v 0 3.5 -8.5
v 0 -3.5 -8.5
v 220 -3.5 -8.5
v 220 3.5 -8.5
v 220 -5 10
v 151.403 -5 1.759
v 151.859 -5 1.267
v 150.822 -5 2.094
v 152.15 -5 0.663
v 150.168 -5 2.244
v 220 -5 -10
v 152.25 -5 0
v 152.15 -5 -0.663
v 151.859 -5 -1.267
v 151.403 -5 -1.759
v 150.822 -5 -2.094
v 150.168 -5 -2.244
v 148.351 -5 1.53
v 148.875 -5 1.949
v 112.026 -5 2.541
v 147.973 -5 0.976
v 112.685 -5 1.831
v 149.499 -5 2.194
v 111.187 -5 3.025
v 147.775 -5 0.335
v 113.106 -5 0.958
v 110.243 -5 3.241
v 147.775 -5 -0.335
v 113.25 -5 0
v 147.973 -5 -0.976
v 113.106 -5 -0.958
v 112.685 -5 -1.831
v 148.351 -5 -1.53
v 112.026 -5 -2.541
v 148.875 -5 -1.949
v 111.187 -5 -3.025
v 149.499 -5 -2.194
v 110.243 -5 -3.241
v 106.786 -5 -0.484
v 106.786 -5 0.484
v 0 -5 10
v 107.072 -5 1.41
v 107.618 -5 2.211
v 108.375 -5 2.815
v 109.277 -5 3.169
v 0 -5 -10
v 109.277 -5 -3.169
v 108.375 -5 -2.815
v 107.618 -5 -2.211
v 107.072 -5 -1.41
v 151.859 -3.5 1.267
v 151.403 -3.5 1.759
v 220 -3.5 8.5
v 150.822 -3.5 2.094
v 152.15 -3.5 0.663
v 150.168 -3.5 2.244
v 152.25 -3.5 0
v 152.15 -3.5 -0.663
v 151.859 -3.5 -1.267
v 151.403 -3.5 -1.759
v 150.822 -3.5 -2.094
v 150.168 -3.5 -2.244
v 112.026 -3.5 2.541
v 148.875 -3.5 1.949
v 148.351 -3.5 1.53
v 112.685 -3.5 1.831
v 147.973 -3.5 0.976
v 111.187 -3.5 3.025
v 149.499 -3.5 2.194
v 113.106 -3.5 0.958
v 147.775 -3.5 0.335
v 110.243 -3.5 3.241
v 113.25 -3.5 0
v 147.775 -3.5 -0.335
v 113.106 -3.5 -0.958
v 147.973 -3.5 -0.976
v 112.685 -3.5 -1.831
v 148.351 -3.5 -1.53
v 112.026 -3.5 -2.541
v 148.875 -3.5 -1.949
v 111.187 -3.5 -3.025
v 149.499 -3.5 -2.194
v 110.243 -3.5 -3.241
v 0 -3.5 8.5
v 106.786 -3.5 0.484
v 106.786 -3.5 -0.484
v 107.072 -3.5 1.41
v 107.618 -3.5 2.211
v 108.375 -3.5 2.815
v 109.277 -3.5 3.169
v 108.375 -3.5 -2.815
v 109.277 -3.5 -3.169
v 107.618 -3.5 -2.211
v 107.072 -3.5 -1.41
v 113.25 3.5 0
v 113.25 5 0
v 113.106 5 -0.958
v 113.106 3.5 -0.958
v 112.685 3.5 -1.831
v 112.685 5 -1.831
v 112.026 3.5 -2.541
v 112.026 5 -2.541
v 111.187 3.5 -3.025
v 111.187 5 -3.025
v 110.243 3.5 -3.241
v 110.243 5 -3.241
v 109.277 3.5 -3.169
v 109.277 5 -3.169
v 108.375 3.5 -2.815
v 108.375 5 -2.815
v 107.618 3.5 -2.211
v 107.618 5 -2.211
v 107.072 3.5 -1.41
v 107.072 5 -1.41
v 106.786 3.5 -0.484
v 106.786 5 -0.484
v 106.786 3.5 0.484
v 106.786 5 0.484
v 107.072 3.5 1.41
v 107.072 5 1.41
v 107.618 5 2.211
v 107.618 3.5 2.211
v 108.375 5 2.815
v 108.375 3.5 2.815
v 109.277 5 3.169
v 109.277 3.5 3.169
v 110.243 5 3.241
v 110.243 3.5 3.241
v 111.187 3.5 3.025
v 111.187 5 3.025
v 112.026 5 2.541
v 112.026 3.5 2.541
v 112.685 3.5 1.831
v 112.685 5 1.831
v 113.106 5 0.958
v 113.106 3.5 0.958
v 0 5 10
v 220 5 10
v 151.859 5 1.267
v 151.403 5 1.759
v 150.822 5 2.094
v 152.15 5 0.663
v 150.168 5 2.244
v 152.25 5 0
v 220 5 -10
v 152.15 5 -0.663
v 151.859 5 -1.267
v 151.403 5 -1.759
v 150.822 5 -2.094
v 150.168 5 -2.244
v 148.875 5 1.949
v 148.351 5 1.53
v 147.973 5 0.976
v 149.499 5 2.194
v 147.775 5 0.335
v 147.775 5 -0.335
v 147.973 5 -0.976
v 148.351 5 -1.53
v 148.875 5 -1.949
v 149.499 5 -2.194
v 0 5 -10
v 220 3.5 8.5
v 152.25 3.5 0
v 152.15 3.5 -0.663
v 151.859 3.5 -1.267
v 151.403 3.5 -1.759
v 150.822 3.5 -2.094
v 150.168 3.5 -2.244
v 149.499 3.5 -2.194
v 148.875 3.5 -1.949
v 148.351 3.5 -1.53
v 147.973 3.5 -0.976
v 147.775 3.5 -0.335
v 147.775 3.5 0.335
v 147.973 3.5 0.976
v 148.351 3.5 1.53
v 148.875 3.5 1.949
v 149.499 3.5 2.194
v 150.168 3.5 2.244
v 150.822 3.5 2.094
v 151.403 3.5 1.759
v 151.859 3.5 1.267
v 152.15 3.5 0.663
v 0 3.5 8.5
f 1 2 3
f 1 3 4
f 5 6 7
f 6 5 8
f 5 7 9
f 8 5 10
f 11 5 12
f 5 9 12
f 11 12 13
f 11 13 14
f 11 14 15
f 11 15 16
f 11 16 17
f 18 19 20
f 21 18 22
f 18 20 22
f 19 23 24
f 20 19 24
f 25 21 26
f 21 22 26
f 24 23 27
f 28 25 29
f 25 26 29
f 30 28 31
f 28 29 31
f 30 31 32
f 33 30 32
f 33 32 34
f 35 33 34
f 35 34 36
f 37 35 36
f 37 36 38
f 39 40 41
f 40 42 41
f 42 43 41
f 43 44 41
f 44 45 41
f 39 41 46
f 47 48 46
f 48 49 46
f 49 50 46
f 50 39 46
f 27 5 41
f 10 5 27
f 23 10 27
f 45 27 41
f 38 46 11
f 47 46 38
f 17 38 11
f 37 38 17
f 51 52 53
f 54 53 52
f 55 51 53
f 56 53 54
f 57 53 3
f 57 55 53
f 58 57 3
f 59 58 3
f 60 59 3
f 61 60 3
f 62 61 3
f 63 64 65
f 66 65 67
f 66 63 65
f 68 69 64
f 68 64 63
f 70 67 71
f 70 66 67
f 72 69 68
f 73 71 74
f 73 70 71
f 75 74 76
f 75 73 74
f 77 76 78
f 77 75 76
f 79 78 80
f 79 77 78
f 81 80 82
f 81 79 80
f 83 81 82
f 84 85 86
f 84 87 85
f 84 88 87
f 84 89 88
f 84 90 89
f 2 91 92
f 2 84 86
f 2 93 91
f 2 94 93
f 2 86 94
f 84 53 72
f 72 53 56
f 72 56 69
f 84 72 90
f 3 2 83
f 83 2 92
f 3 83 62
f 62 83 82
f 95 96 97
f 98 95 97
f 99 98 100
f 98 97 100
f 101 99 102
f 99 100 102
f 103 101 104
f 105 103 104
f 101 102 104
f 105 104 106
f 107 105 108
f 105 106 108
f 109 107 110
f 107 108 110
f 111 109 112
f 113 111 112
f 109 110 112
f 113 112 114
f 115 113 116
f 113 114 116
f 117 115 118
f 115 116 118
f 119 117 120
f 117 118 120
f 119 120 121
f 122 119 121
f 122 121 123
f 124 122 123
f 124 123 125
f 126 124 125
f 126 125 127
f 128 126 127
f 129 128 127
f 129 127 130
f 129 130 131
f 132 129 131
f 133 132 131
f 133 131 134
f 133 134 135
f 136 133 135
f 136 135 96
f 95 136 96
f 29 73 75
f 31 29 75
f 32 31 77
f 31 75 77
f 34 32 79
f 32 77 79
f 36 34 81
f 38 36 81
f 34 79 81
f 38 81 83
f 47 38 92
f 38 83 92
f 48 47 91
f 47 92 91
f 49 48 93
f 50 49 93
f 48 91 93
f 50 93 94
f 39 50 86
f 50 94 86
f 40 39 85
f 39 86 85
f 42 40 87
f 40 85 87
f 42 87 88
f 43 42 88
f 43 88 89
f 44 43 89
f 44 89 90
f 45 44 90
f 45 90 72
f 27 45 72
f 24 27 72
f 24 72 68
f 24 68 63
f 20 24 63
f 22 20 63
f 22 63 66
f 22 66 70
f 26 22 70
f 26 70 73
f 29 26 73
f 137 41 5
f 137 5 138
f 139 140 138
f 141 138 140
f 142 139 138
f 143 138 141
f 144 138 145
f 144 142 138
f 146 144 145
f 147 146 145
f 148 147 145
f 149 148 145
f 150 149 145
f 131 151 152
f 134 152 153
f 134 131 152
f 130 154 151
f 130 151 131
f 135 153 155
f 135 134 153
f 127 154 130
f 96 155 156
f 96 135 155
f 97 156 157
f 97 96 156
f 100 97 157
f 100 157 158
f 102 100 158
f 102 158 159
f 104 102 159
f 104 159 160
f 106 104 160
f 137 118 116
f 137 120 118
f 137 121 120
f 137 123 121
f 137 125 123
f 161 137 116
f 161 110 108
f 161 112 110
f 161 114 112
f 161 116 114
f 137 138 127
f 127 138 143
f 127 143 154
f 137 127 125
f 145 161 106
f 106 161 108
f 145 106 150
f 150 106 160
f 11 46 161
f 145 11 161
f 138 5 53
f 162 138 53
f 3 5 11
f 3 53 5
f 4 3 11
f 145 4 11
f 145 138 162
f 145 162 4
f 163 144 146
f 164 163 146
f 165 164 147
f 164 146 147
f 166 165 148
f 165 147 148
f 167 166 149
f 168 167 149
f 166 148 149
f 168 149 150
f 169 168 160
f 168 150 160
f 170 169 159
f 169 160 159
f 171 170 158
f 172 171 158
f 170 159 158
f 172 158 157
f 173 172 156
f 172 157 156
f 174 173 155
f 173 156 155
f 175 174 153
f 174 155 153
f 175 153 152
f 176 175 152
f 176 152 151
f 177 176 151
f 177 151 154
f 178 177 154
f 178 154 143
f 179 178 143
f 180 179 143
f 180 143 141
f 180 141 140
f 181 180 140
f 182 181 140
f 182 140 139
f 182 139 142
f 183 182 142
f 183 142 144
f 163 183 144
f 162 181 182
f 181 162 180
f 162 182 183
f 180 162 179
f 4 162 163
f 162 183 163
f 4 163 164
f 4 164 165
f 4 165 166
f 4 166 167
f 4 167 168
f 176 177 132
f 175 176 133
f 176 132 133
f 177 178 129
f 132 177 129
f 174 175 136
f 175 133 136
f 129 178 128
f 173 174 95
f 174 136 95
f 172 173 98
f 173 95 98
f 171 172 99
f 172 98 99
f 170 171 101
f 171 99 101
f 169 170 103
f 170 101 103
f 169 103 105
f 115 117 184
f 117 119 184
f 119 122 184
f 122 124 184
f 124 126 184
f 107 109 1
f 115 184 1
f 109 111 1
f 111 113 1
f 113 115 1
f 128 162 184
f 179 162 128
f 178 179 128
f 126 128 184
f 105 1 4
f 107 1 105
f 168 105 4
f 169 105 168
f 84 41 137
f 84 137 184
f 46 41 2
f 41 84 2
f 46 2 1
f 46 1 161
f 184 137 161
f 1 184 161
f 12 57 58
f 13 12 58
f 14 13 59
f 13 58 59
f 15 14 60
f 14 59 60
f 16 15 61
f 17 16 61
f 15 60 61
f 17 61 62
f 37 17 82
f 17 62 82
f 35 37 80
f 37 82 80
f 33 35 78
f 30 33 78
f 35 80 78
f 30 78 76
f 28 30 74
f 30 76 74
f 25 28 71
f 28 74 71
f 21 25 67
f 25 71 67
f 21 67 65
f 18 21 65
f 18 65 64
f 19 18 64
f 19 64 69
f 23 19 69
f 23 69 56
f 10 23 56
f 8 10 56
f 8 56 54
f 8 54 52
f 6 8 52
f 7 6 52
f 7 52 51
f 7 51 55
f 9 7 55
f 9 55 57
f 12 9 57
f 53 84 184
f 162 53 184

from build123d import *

# Parameters (mm, degrees)
SKETCH1_W           = 20
SKETCH1_H           = 10
SKETCH1_W_2         = 17
SKETCH1_H_2         = 7
BOSS_EXTRUDE1_DEPTH = 220
SKETCH2_R           = 3.25
SKETCH2_R_2         = 2.25
CUT_EXTRUDE1_DEPTH  = 11


with BuildPart() as part:
    # Sketch1 → Boss-Extrude1 (new body)
    with BuildSketch(Plane(origin=(0, 0, 0), x_dir=(0, 0, -1), z_dir=(1, 0, 0))):
        Rectangle(SKETCH1_W, SKETCH1_H)
        Rectangle(SKETCH1_W_2, SKETCH1_H_2, mode=Mode.SUBTRACT)
    extrude(amount=BOSS_EXTRUDE1_DEPTH)

    # Sketch2 → Cut-Extrude1 (cut, through all)
    with BuildSketch(Plane(origin=(0, 5, 0), x_dir=(1, 0, 0), z_dir=(0, 1, 0))):
        with Locations((110, 0)):
            Circle(SKETCH2_R)
        with Locations((150, 0)):
            Circle(SKETCH2_R_2)
    extrude(amount=-CUT_EXTRUDE1_DEPTH, mode=Mode.SUBTRACT)


solid = part.part
